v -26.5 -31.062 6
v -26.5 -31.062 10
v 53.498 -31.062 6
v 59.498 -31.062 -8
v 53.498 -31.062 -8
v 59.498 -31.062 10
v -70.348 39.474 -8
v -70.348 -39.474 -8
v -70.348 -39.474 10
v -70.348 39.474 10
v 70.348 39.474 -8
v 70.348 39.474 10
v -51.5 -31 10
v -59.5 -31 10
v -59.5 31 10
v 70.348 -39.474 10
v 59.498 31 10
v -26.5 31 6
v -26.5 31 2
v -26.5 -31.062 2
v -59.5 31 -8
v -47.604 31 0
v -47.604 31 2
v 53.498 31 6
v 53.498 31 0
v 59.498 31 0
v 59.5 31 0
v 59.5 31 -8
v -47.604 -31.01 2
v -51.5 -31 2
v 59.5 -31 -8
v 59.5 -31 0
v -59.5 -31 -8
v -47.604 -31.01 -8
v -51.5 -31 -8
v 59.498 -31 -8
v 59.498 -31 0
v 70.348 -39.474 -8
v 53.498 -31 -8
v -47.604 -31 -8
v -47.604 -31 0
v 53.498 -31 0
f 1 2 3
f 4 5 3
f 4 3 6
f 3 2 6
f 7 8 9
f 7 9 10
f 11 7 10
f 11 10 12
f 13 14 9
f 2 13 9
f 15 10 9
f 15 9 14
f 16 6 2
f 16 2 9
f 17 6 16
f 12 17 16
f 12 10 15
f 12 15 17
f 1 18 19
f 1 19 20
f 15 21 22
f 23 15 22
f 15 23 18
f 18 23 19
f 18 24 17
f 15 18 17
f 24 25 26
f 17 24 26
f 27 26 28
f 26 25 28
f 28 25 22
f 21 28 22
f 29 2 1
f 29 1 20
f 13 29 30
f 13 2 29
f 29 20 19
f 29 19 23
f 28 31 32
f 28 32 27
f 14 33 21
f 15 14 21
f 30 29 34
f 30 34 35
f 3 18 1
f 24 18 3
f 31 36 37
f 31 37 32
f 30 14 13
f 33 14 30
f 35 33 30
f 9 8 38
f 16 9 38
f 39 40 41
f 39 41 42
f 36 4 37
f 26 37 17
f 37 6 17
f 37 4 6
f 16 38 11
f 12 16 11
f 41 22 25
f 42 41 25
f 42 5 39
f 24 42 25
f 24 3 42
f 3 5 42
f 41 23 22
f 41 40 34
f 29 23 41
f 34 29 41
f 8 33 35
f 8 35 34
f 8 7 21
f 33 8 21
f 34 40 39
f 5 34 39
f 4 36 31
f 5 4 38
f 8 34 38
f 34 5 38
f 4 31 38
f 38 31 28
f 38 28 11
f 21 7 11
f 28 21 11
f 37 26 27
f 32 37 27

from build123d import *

# Parameters (mm, degrees)
EXTRUDE_1_DEPTH      = 10
EXTRUDE_1_DEPTH_BACK = 8
SKETCH_1_W           = 140.696839698
SKETCH_1_H           = 78.948263704
SKETCH_1_W_2         = 119
SKETCH_1_H_2         = 62
SKETCH_2_W           = 111
SKETCH_2_H           = 62
EXTRUDE_2_DEPTH      = 10
CUT_EXTRUDE_1_DEPTH  = 8
CUT_EXTRUDE_2_DEPTH  = 82.284114443
SKETCH_5_W           = 6
SKETCH_5_H           = 62.061558852
CUT_EXTRUDE_3_DEPTH  = 83.650512768
SKETCH_6_W           = 79.998419849
SKETCH_6_H           = 62.061558852
CUT_EXTRUDE_4_DEPTH  = 4


with BuildPart() as part:
    # 草图1 → 凸台-拉伸1 (new, two sides: drawn at the far end of the back side and taken through both)
    with BuildSketch(Plane.XY.offset(-EXTRUDE_1_DEPTH_BACK)):
        Rectangle(SKETCH_1_W, SKETCH_1_H)
        Rectangle(SKETCH_1_W_2, SKETCH_1_H_2, mode=Mode.SUBTRACT)
    extrude(amount=EXTRUDE_1_DEPTH + EXTRUDE_1_DEPTH_BACK)

    # 草图2 → 凸台-拉伸2 (add)
    with BuildSketch(Plane.XY):
        with Locations((4, 0)):
            Rectangle(SKETCH_2_W, SKETCH_2_H)
    extrude(amount=EXTRUDE_2_DEPTH)

    # 草图3 → 切除-拉伸1 (cut)
    with BuildSketch(Plane.XY.offset(10)):
        Polygon((-51.5, 31), (-26.5, 31), (-26.5, -31.061558852), (-51.5, -31), align=None)
    extrude(amount=-CUT_EXTRUDE_1_DEPTH, mode=Mode.SUBTRACT)

    # 草图4 → 切除-拉伸2 (cut, through all)
    with BuildSketch(Plane.XY.offset(2)):
        Polygon((-51.5, 31), (-47.603613943, 31), (-47.603613943, -31.009594282), (-51.5, -31), align=None)
    extrude(amount=-CUT_EXTRUDE_2_DEPTH, mode=Mode.SUBTRACT)

    # 草图5 → 切除-拉伸3 (cut, through all)
    with BuildSketch(Plane.XY.offset(10)):
        with Locations((56.498419849, -0.030779426)):
            Rectangle(SKETCH_5_W, SKETCH_5_H)
    extrude(amount=-CUT_EXTRUDE_3_DEPTH, mode=Mode.SUBTRACT)

    # 草图6 → 切除-拉伸4 (cut)
    with BuildSketch(Plane.XY.offset(10)):
        with Locations((13.499209925, -0.030779426)):
            Rectangle(SKETCH_6_W, SKETCH_6_H)
    extrude(amount=-CUT_EXTRUDE_4_DEPTH, mode=Mode.SUBTRACT)


solid = part.part
